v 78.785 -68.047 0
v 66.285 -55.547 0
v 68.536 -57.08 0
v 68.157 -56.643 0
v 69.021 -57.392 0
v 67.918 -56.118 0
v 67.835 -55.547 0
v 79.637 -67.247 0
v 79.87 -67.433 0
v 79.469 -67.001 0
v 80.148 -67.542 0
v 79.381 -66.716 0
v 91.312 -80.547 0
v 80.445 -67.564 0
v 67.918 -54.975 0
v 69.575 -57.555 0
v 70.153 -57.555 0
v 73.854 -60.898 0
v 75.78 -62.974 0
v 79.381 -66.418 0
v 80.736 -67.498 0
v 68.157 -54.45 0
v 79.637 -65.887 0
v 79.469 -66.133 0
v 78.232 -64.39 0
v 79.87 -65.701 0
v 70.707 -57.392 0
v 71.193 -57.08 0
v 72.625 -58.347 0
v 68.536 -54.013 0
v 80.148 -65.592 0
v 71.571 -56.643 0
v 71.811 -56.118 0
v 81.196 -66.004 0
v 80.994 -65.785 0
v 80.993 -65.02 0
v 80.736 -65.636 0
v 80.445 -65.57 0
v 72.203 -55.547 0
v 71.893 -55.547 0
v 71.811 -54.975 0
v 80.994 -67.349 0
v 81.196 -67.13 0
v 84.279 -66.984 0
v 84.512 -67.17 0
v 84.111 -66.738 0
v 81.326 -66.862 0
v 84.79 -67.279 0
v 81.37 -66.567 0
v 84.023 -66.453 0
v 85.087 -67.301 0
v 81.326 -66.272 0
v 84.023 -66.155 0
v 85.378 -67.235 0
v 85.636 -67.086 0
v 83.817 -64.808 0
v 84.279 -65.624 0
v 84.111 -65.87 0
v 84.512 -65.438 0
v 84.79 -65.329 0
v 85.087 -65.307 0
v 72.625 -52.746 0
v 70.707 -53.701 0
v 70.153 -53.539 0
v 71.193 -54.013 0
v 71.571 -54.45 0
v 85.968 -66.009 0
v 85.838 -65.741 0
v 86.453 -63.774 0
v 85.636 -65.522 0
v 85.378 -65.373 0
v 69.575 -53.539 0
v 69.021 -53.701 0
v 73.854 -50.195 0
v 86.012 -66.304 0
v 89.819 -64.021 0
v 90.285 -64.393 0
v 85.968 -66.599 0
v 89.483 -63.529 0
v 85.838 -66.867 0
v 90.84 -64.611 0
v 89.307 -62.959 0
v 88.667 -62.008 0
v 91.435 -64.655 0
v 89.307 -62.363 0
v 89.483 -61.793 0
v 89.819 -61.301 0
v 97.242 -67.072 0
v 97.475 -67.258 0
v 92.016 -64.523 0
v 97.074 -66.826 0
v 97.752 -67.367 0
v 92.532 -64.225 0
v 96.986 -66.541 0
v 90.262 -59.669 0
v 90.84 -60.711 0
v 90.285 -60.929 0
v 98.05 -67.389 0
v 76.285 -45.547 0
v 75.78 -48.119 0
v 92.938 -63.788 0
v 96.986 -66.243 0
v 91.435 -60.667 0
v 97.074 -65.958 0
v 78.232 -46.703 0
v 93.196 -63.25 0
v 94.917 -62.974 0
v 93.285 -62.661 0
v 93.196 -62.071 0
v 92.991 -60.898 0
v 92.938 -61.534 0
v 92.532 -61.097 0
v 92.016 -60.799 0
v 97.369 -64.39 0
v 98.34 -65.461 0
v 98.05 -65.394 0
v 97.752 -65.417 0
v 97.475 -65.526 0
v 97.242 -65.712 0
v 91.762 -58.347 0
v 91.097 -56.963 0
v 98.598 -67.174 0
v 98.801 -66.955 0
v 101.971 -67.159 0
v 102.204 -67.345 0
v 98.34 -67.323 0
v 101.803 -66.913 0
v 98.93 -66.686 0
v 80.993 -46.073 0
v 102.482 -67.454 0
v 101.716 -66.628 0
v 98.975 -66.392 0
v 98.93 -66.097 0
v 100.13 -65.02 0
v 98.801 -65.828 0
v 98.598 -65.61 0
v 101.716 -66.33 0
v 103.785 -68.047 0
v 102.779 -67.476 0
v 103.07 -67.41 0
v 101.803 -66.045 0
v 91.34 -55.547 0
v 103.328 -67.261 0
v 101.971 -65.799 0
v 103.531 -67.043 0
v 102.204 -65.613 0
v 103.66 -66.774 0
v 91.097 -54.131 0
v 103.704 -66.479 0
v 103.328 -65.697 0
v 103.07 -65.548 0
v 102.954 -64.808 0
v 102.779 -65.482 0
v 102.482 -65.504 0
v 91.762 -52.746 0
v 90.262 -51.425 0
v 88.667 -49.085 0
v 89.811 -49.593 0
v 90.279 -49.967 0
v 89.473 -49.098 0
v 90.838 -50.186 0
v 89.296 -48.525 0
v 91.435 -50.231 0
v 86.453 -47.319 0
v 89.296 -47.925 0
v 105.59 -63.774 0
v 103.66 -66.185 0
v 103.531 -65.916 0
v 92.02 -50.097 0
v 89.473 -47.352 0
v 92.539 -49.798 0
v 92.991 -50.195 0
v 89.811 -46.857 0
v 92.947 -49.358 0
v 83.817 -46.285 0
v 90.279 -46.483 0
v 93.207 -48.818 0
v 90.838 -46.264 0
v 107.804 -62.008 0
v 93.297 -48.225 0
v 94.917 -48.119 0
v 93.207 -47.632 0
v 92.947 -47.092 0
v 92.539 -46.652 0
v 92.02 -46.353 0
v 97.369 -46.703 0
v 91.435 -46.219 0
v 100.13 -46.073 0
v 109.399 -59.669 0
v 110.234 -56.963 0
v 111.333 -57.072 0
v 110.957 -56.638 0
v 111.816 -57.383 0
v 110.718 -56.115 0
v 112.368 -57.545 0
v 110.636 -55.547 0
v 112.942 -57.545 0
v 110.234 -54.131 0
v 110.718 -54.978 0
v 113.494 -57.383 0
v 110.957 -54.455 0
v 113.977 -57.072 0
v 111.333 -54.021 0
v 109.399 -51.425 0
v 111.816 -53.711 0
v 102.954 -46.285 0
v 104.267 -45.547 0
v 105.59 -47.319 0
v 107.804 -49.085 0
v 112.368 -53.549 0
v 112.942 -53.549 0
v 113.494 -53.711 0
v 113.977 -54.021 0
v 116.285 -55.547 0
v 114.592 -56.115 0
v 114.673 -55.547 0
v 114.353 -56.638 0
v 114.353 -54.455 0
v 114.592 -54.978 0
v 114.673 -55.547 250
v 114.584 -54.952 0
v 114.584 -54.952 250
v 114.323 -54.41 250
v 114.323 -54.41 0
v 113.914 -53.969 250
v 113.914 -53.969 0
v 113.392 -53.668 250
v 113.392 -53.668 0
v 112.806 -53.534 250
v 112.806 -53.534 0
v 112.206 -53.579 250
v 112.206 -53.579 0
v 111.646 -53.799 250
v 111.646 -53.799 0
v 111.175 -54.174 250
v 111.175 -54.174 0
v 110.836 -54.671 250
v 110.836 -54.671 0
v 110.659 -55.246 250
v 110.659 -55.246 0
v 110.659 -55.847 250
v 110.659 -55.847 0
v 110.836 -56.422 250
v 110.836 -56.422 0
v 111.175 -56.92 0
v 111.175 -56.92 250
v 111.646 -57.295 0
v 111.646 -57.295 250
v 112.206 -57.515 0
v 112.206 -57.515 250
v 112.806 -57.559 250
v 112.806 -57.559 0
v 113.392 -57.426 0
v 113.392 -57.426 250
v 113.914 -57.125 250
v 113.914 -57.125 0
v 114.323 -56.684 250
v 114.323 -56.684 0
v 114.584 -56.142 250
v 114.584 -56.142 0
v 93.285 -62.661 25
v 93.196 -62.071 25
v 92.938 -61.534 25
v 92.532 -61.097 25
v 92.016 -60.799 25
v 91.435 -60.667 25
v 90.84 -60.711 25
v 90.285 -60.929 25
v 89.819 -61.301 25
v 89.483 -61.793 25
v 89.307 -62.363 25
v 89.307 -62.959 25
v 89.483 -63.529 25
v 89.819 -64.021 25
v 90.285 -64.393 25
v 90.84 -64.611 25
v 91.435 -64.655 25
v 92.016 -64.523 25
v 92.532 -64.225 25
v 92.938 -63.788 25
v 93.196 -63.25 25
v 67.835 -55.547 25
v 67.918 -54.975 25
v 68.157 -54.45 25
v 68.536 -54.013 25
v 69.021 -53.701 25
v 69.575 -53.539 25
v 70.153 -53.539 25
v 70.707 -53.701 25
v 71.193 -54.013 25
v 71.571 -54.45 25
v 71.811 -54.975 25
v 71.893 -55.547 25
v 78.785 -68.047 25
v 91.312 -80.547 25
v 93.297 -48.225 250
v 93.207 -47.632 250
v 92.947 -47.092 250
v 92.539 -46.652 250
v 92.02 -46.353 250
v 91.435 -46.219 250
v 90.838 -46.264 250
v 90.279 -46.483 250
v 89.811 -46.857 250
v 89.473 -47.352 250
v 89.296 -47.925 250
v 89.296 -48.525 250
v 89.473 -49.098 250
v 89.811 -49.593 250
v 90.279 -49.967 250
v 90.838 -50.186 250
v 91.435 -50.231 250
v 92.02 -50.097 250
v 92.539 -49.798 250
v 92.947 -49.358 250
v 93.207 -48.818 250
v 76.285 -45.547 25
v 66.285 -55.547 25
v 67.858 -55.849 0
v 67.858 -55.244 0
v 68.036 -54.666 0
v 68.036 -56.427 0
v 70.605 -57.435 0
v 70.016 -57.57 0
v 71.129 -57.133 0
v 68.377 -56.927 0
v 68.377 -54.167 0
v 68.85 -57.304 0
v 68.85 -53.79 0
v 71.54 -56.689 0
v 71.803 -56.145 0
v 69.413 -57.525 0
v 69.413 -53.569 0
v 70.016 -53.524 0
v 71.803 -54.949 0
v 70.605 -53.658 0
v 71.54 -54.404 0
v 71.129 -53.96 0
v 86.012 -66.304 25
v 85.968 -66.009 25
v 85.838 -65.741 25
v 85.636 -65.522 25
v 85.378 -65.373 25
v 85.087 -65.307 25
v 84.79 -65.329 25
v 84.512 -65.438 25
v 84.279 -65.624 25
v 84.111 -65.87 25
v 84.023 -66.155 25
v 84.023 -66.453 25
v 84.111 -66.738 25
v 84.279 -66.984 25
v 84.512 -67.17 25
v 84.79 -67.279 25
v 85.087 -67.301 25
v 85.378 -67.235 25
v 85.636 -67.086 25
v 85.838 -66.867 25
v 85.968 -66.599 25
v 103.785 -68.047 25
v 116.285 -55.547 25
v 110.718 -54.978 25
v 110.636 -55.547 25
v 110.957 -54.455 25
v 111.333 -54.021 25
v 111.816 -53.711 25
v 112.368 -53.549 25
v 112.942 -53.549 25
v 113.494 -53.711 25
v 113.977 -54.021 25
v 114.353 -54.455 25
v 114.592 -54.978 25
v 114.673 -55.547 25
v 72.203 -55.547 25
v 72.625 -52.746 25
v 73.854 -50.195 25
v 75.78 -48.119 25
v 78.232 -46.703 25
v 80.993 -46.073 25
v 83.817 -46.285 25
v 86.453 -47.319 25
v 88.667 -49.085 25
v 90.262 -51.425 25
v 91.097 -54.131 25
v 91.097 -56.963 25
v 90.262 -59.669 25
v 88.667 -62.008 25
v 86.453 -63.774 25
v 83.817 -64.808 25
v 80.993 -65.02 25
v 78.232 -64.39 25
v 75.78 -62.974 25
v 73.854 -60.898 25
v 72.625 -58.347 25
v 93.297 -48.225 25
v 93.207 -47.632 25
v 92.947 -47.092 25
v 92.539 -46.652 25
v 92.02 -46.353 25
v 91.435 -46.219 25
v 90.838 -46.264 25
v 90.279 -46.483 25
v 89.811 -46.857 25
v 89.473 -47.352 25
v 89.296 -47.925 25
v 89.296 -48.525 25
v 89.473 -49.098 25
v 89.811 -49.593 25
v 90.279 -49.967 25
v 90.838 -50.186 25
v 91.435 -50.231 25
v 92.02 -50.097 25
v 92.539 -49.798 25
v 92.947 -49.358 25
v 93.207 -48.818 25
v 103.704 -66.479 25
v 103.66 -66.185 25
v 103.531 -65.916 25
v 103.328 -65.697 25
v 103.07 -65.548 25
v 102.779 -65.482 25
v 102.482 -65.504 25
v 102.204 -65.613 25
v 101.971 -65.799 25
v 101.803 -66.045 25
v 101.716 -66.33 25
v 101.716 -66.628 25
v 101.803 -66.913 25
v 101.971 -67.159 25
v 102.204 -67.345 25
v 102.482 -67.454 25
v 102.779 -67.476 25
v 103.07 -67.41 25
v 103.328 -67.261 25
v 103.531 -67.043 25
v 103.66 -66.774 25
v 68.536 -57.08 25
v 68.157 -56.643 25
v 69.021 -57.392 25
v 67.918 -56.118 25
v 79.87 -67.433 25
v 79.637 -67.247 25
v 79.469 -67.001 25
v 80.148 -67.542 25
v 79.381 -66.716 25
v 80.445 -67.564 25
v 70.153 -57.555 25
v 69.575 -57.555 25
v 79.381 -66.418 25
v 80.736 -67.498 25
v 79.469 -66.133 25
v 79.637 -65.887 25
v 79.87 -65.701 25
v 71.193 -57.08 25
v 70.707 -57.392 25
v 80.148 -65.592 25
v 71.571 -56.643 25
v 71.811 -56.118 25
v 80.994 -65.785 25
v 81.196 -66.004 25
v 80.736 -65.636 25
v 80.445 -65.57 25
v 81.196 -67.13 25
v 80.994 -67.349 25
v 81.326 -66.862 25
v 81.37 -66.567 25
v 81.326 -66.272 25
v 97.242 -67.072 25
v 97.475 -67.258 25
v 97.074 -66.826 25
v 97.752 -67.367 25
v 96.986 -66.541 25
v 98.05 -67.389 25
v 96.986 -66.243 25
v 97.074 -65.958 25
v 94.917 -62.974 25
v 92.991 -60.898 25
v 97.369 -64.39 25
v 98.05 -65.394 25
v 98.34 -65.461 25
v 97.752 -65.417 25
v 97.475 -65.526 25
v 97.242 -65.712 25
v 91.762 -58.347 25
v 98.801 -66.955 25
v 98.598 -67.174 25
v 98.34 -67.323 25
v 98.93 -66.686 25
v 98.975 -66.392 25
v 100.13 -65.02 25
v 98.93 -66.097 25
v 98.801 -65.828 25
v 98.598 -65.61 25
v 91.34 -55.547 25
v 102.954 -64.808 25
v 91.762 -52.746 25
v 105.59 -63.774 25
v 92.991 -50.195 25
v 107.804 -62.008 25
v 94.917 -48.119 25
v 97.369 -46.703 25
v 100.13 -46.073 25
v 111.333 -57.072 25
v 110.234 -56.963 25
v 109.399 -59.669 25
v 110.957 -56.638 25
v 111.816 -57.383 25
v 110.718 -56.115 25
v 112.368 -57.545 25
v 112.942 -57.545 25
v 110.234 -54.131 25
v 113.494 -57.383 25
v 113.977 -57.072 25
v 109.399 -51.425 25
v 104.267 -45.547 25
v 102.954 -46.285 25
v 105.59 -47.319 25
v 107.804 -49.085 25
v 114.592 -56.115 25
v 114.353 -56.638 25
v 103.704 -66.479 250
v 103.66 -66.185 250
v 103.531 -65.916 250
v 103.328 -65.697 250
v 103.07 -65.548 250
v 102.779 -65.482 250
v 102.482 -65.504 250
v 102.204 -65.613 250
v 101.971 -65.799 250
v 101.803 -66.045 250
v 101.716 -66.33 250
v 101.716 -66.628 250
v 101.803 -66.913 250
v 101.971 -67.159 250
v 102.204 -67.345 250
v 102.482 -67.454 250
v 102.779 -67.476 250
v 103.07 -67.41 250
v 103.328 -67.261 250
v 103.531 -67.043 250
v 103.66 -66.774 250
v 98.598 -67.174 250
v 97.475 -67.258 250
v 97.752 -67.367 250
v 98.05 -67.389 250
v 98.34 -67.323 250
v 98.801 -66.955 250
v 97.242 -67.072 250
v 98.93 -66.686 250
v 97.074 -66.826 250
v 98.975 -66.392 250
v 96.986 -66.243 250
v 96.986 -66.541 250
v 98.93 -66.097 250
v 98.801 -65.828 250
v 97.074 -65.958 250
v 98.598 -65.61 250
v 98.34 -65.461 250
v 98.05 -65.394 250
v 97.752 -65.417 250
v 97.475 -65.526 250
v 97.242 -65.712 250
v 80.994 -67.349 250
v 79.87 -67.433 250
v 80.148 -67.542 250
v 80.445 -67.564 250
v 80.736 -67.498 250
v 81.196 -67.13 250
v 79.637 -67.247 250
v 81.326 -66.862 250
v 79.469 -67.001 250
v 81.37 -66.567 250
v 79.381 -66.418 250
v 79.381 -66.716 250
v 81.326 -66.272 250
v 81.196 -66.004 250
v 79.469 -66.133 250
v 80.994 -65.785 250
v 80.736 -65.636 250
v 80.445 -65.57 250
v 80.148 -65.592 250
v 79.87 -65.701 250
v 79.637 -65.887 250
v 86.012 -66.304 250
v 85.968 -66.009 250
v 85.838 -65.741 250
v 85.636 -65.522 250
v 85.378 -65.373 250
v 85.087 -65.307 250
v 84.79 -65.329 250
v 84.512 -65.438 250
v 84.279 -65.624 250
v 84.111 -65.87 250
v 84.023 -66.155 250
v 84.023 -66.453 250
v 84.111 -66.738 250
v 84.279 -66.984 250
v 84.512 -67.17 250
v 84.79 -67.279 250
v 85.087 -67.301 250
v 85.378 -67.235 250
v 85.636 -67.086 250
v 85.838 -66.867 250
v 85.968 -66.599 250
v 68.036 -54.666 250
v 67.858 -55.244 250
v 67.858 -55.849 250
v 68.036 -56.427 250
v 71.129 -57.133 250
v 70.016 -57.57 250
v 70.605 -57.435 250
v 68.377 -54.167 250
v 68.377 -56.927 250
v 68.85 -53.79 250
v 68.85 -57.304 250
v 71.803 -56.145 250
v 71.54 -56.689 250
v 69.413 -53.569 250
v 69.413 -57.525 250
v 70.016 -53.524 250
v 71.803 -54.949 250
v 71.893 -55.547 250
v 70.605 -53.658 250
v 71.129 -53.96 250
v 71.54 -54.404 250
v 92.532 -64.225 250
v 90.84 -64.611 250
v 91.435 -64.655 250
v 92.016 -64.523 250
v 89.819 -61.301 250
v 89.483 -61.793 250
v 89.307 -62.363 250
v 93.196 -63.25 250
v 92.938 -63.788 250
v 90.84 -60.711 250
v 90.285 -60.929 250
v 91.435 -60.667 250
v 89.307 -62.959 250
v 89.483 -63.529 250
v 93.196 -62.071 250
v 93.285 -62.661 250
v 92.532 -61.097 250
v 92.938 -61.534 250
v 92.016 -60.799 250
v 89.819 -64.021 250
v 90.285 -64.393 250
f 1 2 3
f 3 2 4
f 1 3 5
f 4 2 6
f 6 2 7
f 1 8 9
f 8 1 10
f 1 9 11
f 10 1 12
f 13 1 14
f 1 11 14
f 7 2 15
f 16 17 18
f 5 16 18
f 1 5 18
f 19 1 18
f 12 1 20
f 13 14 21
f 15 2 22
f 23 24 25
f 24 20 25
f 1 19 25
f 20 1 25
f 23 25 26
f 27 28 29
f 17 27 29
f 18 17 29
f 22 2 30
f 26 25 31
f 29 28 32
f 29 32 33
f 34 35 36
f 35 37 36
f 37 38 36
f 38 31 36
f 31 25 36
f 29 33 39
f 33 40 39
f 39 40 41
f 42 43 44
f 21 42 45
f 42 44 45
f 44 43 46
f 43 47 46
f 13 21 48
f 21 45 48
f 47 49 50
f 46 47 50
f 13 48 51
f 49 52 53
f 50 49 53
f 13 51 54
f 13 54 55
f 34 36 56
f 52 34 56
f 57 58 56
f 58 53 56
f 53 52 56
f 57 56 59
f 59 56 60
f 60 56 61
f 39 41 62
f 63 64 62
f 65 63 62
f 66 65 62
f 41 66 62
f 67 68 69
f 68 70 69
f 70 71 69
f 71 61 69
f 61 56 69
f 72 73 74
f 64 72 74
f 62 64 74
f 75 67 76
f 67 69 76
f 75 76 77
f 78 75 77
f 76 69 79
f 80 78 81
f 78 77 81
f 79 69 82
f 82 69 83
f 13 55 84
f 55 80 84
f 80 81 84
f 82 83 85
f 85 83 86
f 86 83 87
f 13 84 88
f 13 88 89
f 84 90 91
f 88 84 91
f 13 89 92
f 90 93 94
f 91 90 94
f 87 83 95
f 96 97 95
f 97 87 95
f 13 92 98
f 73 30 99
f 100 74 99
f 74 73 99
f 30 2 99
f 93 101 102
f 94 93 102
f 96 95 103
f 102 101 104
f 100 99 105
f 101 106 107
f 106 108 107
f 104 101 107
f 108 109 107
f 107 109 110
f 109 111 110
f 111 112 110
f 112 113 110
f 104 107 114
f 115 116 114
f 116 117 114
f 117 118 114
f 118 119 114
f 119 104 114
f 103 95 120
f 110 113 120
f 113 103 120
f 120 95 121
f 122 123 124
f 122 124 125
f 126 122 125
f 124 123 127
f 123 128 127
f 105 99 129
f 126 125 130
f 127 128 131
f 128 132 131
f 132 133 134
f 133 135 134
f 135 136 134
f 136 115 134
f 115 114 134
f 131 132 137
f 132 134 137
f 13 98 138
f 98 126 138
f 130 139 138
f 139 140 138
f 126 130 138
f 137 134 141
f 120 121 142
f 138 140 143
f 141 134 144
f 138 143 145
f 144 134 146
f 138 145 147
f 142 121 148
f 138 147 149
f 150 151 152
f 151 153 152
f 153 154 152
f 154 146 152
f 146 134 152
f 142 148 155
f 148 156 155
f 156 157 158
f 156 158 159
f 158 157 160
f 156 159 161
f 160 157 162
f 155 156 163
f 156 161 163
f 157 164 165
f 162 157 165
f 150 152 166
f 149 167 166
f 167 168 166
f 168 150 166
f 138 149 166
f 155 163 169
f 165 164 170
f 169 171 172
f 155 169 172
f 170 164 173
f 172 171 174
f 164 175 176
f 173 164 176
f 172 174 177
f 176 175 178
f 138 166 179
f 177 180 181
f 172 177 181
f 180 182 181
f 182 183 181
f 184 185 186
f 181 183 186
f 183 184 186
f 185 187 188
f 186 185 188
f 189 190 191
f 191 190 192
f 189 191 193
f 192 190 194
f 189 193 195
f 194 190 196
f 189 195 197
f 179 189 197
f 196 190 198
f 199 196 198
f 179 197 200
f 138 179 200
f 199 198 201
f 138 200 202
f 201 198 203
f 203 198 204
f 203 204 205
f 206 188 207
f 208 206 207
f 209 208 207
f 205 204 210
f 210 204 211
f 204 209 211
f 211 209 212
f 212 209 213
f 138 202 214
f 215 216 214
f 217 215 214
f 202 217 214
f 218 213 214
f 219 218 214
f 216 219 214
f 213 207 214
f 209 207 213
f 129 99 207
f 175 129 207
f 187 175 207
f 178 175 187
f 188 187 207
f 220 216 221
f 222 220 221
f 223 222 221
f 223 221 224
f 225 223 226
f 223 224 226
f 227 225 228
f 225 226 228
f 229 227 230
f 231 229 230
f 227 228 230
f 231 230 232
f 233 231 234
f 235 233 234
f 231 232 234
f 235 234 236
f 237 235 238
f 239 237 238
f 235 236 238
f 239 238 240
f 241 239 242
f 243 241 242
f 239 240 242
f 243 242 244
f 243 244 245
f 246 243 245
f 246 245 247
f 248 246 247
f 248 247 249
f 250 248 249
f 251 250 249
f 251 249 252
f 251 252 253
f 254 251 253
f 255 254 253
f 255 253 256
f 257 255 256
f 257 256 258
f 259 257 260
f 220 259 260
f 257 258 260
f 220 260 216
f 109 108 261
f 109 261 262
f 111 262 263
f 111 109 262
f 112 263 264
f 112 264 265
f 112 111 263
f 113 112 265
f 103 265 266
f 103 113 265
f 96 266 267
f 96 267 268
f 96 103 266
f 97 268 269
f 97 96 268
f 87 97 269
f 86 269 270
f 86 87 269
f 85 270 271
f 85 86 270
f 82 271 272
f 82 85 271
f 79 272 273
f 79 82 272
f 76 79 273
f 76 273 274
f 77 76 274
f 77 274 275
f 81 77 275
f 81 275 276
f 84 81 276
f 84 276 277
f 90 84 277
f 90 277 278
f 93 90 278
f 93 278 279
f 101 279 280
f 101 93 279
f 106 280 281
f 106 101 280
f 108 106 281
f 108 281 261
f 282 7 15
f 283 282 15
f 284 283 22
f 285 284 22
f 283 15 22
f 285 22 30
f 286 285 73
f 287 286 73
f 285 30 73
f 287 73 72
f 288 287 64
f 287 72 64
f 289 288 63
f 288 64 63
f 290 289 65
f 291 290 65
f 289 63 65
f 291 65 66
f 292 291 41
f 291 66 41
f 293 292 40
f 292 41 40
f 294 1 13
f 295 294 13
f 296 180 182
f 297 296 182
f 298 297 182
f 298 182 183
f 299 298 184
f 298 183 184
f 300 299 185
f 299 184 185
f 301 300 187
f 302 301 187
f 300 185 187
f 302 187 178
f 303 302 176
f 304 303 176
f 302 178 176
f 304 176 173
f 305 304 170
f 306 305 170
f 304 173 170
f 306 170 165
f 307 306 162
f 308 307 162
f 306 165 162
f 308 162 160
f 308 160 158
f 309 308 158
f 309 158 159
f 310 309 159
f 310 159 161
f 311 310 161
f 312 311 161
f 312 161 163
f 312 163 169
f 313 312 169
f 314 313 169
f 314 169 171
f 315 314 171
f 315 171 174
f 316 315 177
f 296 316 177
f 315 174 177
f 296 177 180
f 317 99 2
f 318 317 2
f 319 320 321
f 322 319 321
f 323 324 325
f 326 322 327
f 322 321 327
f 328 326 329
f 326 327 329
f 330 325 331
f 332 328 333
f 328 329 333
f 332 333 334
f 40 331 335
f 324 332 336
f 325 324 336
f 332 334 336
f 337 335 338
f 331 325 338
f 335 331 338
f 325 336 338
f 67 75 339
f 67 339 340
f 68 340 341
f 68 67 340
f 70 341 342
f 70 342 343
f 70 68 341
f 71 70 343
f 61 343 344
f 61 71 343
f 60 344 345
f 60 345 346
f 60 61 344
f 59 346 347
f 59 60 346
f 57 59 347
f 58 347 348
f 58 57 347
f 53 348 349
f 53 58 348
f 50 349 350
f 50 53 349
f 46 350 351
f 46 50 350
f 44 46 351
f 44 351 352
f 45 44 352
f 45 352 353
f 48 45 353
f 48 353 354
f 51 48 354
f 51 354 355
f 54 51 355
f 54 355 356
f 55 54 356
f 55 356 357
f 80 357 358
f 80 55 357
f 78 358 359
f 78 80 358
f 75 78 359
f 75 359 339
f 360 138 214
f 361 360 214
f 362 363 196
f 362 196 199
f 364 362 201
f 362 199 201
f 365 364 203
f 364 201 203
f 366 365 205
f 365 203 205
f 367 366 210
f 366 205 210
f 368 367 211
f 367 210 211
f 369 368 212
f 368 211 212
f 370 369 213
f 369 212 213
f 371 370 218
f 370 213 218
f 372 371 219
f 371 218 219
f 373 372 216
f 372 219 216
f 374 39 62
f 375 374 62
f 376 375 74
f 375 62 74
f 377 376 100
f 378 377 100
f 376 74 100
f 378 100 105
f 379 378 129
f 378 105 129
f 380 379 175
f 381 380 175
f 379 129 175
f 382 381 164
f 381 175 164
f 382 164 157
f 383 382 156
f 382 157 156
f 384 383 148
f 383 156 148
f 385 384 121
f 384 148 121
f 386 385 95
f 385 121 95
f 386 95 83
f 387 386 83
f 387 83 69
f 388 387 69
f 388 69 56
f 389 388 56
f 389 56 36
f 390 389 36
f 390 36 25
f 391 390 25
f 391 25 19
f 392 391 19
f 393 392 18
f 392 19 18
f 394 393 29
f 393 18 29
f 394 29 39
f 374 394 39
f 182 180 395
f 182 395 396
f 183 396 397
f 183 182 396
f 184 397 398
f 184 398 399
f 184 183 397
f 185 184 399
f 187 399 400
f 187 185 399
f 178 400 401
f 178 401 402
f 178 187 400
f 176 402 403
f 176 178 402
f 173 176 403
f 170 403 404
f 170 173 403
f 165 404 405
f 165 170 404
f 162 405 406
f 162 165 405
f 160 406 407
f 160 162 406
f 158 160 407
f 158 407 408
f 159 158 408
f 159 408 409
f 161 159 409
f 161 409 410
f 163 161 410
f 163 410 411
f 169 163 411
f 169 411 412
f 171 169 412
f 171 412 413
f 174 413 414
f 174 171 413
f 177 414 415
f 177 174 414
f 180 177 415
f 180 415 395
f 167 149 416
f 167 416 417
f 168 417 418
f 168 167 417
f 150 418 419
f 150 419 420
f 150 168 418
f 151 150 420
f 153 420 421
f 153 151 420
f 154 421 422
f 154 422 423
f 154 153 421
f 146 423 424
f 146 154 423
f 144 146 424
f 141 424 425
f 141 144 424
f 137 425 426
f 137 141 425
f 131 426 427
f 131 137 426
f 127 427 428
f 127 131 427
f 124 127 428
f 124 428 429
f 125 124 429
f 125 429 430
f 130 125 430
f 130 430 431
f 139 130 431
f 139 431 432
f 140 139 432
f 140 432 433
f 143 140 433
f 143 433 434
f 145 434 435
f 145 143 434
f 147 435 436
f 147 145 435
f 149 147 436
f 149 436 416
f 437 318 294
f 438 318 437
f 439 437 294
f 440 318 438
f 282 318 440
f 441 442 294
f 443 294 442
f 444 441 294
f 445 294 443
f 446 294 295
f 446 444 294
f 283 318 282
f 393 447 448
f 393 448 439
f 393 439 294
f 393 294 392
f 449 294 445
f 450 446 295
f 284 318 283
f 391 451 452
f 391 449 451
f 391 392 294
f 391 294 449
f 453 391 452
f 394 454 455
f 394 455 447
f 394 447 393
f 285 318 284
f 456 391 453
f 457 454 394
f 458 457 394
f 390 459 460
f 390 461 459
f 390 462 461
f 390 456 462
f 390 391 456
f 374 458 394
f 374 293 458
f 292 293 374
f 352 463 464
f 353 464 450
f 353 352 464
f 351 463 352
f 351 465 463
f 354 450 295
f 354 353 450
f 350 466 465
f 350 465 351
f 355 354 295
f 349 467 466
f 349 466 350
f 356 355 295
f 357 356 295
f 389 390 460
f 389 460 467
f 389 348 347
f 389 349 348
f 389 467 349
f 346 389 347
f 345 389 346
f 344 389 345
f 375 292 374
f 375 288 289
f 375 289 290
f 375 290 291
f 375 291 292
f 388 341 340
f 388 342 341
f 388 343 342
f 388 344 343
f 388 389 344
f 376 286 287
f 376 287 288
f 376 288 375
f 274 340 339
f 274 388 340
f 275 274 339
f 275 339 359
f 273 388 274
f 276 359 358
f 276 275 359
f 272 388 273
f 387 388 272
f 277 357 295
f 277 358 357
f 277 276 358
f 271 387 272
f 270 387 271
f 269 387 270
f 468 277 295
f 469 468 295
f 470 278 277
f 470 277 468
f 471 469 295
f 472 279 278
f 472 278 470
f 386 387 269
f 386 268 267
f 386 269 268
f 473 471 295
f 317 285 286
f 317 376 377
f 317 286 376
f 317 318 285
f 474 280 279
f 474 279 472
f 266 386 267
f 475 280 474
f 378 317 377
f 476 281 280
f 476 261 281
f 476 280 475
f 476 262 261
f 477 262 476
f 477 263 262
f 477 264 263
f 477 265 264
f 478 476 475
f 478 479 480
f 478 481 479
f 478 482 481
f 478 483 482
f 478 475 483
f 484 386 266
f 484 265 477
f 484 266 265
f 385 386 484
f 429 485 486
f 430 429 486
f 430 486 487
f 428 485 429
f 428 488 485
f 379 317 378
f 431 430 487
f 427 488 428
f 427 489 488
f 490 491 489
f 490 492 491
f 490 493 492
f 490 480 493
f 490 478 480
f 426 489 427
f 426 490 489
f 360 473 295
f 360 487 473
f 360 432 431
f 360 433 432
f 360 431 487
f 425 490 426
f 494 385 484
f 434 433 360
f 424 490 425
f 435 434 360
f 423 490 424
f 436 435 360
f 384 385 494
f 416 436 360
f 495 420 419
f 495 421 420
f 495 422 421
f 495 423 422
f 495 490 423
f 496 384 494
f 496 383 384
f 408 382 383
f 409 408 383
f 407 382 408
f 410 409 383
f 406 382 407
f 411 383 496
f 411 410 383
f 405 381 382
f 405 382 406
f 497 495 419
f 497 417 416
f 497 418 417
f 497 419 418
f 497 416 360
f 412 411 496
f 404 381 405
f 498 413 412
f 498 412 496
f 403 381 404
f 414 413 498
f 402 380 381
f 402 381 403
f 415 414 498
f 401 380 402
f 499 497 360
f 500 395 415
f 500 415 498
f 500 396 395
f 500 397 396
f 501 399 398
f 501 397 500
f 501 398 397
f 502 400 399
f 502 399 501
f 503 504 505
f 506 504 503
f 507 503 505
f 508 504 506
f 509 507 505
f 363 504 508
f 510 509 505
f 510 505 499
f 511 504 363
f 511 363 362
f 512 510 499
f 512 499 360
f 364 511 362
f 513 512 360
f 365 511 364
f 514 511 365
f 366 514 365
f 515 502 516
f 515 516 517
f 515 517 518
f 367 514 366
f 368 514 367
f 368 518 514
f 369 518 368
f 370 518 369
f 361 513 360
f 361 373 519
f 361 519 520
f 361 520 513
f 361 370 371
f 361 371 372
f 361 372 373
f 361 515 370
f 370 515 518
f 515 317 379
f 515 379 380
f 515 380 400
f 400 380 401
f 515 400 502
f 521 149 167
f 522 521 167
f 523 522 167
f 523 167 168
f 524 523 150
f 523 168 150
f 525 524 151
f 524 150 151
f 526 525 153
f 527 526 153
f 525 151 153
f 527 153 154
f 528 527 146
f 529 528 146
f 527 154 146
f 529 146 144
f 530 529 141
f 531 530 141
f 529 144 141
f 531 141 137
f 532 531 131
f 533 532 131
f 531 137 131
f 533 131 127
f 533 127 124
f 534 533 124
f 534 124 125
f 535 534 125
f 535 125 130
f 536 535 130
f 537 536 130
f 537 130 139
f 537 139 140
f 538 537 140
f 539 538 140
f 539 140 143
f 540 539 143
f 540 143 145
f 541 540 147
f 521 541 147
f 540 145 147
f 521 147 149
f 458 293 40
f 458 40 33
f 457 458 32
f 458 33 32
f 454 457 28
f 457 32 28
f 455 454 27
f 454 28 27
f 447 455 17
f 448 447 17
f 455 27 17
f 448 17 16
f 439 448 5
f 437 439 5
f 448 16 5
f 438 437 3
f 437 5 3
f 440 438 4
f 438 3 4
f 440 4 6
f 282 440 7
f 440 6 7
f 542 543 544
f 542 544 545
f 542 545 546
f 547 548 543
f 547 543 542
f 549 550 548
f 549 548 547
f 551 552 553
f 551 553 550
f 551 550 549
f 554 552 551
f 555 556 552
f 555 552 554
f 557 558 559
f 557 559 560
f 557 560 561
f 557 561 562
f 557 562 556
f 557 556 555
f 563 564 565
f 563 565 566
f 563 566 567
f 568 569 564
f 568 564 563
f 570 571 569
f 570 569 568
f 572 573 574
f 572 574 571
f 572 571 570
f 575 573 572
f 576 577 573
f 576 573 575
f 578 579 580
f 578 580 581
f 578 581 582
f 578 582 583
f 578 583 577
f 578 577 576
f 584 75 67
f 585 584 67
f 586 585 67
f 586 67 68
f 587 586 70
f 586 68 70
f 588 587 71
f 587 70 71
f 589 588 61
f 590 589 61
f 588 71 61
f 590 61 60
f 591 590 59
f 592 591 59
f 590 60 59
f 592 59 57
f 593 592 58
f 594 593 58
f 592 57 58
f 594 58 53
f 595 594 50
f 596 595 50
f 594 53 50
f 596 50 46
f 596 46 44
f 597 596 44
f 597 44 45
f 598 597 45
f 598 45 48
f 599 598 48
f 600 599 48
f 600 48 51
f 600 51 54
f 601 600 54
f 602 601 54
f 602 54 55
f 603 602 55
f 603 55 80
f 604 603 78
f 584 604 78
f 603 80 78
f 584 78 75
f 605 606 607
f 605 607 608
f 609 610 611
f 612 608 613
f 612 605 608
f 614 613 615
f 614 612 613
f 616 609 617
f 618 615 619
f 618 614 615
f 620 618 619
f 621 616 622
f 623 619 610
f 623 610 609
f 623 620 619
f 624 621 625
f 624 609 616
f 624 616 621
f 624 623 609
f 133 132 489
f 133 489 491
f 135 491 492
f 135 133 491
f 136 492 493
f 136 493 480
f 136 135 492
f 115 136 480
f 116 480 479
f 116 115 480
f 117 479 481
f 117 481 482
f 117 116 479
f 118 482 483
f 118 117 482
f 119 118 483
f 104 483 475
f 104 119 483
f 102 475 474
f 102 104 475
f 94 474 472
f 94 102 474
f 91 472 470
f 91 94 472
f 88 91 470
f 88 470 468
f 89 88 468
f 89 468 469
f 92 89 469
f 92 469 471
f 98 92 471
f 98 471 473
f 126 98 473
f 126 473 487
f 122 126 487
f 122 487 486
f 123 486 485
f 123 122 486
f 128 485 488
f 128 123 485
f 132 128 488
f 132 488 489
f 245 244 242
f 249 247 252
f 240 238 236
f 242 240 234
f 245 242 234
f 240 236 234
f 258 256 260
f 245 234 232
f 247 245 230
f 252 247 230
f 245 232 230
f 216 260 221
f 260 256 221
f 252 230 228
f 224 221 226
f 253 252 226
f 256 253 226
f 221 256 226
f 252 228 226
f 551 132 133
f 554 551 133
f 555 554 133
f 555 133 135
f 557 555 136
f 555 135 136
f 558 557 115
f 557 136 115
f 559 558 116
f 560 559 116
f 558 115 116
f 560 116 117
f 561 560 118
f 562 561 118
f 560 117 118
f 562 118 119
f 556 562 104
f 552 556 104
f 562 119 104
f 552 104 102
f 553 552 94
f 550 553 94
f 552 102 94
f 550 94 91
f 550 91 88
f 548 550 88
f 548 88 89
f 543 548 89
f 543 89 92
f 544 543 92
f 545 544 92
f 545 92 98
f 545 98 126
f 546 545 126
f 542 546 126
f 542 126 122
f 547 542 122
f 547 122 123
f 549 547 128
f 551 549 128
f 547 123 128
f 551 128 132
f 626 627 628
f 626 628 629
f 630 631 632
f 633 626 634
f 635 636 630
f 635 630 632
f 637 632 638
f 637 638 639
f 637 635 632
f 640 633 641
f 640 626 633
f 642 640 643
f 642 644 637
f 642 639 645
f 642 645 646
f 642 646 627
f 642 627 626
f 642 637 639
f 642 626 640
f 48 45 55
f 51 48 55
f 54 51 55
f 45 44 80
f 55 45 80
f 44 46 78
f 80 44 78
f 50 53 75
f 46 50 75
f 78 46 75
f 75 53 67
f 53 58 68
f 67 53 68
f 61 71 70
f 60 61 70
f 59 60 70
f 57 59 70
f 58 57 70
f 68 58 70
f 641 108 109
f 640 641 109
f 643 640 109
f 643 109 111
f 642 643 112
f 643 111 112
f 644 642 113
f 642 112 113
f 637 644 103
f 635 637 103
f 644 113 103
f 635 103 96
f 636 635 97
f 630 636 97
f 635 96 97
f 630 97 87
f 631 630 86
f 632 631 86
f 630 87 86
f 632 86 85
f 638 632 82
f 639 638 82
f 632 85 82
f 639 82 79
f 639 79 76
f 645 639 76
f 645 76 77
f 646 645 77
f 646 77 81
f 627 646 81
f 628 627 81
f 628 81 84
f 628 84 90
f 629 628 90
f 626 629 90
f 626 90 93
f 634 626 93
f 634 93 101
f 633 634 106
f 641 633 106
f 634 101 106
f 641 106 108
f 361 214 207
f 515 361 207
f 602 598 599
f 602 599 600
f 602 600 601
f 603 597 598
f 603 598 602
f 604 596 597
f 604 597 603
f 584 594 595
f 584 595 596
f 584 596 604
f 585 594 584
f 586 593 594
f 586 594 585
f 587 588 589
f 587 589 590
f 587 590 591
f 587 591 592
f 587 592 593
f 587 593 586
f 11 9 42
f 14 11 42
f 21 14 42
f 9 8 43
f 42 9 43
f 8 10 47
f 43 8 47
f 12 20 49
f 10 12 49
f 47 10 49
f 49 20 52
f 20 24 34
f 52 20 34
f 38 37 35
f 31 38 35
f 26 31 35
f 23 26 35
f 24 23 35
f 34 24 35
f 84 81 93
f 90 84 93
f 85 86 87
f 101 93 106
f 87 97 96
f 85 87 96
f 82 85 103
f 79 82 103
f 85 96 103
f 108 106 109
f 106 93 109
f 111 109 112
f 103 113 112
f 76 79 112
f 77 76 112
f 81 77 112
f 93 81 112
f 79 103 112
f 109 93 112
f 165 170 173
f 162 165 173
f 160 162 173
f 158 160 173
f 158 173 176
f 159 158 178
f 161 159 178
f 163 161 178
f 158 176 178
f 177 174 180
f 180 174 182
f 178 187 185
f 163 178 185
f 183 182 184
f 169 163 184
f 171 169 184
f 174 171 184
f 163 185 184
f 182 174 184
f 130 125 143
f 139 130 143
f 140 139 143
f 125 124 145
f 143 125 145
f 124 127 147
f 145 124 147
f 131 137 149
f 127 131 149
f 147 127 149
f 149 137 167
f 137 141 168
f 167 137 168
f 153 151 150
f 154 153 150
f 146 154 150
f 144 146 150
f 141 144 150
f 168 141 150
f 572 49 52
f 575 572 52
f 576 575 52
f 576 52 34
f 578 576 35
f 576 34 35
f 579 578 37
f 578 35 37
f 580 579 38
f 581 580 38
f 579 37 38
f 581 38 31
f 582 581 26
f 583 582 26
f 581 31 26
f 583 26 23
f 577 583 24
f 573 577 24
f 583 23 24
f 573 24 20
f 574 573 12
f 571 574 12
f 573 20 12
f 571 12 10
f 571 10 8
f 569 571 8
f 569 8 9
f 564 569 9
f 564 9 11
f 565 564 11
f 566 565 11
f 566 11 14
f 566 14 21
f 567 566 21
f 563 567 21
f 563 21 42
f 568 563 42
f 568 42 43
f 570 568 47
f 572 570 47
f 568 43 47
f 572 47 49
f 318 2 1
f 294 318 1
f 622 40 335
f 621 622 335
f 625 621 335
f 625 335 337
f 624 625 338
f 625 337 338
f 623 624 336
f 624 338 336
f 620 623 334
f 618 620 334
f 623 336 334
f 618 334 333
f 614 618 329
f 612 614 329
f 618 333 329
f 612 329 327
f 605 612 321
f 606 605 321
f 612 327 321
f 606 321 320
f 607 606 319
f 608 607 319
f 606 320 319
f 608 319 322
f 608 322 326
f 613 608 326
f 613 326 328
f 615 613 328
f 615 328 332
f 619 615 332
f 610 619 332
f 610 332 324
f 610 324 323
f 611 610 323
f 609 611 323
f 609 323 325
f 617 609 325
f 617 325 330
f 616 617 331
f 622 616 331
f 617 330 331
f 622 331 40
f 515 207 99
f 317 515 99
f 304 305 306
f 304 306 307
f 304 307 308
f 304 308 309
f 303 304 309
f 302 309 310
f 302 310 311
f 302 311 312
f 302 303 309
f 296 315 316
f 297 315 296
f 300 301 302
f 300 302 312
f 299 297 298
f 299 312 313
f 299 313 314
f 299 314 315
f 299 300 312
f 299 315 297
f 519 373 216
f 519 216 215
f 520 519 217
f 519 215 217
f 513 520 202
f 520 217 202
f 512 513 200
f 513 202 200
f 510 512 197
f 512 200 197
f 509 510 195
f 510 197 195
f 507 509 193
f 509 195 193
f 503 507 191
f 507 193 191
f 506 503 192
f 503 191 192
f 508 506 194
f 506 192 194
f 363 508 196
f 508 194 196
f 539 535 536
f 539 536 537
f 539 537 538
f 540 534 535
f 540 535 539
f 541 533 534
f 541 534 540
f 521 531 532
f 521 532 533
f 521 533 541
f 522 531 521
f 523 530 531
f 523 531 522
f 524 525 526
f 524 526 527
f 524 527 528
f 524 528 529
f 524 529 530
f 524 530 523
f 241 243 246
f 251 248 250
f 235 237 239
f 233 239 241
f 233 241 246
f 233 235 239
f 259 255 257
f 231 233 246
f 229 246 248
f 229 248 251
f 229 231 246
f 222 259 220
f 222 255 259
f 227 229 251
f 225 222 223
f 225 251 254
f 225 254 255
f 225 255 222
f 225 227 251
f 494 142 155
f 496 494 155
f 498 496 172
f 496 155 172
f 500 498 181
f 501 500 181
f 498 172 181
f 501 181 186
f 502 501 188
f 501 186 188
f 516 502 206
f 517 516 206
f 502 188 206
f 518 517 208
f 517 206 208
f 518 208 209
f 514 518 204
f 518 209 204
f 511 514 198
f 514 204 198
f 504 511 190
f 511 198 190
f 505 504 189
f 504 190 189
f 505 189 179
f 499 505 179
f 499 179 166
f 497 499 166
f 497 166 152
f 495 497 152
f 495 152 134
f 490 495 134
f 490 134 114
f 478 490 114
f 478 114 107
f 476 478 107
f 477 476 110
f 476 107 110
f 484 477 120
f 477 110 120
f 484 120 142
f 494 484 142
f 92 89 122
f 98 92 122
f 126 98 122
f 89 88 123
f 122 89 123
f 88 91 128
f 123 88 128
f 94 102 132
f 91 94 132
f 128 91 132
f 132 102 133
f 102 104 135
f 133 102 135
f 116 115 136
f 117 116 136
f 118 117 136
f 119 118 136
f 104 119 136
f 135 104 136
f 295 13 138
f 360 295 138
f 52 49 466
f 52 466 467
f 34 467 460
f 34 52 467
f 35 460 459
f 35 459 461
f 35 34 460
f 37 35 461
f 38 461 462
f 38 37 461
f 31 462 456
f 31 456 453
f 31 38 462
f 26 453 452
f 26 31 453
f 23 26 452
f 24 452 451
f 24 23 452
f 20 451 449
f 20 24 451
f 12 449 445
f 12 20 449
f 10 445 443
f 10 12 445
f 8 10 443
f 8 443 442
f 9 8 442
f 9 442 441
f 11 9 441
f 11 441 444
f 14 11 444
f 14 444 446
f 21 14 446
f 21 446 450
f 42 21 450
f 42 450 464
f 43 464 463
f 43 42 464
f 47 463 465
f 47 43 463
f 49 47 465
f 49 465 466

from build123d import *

# Parameters (mm, degrees)
F0_R     = 2.011409
F0_R_2   = 2.018501
F0_R_3   = 1
F0_R_4   = 2
F0_R_5   = 2.02876
F1_DEPTH = 250
F2_R     = 1
F2_R_2   = 2
F2_R_3   = 2.011409
F3_DEPTH = 25


with BuildPart() as f1:
    # F0 (on Top) → F1 (new body)
    with BuildSketch(Plane.XY):
        with Locations((91.285117, -48.225049)):
            Circle(F0_R)
        with Locations((112.654991, -55.546634)):
            Circle(F0_R_2)
        with Locations((102.704443, -66.479258)):
            Circle(F0_R_3)
        with Locations((97.974852, -66.391677)):
            Circle(F0_R_3)
        with Locations((91.285117, -62.660962)):
            Circle(F0_R_4)
        with Locations((85.01225, -66.304088)):
            Circle(F0_R_3)
        with Locations((80.37024, -66.56684)):
            Circle(F0_R_3)
        with Locations((69.864146, -55.546634)):
            Circle(F0_R_5)
    extrude(amount=F1_DEPTH)


with BuildPart() as f3:
    # F2 (on Top) → F3 (new body)
    with BuildSketch(Plane.XY):
        with BuildLine():
            Line((116.285117, -55.546634), (114.673492, -55.546634))
            ThreePointArc((114.673492, -55.546634), (112.654991, -57.565135), (110.636491, -55.546634))
            Line((110.636491, -55.546634), (110.339861, -55.546634))
            ThreePointArc((110.339861, -55.546634), (100.839861, -65.046634), (91.339861, -55.546634))
            Line((91.339861, -55.546634), (91.202963, -55.546634))
            ThreePointArc((91.202963, -55.546634), (81.702963, -65.046634), (72.202963, -55.546634))
            Line((72.202963, -55.546634), (71.892907, -55.546634))
            ThreePointArc((71.892907, -55.546634), (69.864146, -57.575394), (67.835386, -55.546634))
            Line((67.835386, -55.546634), (66.285117, -55.546634))
            Line((66.285117, -55.546634), (78.785117, -68.046634))
            Line((78.785117, -68.046634), (103.785117, -68.046634))
            Line((103.785117, -68.046634), (116.285117, -55.546634))
        make_face()
        with Locations((80.37024, -66.56684)):
            Circle(F2_R, mode=Mode.SUBTRACT)
        with Locations((85.01225, -66.304088)):
            Circle(F2_R, mode=Mode.SUBTRACT)
        with Locations((97.974852, -66.391677)):
            Circle(F2_R, mode=Mode.SUBTRACT)
        with Locations((102.704443, -66.479258)):
            Circle(F2_R, mode=Mode.SUBTRACT)
        with Locations((91.285117, -62.660962)):
            Circle(F2_R_2, mode=Mode.SUBTRACT)
        with BuildLine():
            ThreePointArc((110.636491, -55.546634), (112.654991, -53.528133), (114.673492, -55.546634))
            Line((114.673492, -55.546634), (116.285117, -55.546634))
            Line((116.285117, -55.546634), (104.267327, -45.546634))
            Line((104.267327, -45.546634), (76.285117, -45.546634))
            Line((76.285117, -45.546634), (66.285117, -55.546634))
            Line((66.285117, -55.546634), (67.835386, -55.546634))
            ThreePointArc((67.835386, -55.546634), (69.864146, -53.517874), (71.892907, -55.546634))
            Line((71.892907, -55.546634), (72.202963, -55.546634))
            ThreePointArc((72.202963, -55.546634), (81.702963, -46.046634), (91.202963, -55.546634))
            Line((91.202963, -55.546634), (91.339861, -55.546634))
            ThreePointArc((91.339861, -55.546634), (100.839861, -46.046634), (110.339861, -55.546634))
            Line((110.339861, -55.546634), (110.636491, -55.546634))
        make_face()
        with Locations((91.285117, -48.225049)):
            Circle(F2_R_3, mode=Mode.SUBTRACT)
        Polygon((91.311842, -80.54664), (103.785117, -68.046634), (78.785117, -68.046634), align=None)
    extrude(amount=F3_DEPTH)


solid = Compound([f1.part, f3.part])
